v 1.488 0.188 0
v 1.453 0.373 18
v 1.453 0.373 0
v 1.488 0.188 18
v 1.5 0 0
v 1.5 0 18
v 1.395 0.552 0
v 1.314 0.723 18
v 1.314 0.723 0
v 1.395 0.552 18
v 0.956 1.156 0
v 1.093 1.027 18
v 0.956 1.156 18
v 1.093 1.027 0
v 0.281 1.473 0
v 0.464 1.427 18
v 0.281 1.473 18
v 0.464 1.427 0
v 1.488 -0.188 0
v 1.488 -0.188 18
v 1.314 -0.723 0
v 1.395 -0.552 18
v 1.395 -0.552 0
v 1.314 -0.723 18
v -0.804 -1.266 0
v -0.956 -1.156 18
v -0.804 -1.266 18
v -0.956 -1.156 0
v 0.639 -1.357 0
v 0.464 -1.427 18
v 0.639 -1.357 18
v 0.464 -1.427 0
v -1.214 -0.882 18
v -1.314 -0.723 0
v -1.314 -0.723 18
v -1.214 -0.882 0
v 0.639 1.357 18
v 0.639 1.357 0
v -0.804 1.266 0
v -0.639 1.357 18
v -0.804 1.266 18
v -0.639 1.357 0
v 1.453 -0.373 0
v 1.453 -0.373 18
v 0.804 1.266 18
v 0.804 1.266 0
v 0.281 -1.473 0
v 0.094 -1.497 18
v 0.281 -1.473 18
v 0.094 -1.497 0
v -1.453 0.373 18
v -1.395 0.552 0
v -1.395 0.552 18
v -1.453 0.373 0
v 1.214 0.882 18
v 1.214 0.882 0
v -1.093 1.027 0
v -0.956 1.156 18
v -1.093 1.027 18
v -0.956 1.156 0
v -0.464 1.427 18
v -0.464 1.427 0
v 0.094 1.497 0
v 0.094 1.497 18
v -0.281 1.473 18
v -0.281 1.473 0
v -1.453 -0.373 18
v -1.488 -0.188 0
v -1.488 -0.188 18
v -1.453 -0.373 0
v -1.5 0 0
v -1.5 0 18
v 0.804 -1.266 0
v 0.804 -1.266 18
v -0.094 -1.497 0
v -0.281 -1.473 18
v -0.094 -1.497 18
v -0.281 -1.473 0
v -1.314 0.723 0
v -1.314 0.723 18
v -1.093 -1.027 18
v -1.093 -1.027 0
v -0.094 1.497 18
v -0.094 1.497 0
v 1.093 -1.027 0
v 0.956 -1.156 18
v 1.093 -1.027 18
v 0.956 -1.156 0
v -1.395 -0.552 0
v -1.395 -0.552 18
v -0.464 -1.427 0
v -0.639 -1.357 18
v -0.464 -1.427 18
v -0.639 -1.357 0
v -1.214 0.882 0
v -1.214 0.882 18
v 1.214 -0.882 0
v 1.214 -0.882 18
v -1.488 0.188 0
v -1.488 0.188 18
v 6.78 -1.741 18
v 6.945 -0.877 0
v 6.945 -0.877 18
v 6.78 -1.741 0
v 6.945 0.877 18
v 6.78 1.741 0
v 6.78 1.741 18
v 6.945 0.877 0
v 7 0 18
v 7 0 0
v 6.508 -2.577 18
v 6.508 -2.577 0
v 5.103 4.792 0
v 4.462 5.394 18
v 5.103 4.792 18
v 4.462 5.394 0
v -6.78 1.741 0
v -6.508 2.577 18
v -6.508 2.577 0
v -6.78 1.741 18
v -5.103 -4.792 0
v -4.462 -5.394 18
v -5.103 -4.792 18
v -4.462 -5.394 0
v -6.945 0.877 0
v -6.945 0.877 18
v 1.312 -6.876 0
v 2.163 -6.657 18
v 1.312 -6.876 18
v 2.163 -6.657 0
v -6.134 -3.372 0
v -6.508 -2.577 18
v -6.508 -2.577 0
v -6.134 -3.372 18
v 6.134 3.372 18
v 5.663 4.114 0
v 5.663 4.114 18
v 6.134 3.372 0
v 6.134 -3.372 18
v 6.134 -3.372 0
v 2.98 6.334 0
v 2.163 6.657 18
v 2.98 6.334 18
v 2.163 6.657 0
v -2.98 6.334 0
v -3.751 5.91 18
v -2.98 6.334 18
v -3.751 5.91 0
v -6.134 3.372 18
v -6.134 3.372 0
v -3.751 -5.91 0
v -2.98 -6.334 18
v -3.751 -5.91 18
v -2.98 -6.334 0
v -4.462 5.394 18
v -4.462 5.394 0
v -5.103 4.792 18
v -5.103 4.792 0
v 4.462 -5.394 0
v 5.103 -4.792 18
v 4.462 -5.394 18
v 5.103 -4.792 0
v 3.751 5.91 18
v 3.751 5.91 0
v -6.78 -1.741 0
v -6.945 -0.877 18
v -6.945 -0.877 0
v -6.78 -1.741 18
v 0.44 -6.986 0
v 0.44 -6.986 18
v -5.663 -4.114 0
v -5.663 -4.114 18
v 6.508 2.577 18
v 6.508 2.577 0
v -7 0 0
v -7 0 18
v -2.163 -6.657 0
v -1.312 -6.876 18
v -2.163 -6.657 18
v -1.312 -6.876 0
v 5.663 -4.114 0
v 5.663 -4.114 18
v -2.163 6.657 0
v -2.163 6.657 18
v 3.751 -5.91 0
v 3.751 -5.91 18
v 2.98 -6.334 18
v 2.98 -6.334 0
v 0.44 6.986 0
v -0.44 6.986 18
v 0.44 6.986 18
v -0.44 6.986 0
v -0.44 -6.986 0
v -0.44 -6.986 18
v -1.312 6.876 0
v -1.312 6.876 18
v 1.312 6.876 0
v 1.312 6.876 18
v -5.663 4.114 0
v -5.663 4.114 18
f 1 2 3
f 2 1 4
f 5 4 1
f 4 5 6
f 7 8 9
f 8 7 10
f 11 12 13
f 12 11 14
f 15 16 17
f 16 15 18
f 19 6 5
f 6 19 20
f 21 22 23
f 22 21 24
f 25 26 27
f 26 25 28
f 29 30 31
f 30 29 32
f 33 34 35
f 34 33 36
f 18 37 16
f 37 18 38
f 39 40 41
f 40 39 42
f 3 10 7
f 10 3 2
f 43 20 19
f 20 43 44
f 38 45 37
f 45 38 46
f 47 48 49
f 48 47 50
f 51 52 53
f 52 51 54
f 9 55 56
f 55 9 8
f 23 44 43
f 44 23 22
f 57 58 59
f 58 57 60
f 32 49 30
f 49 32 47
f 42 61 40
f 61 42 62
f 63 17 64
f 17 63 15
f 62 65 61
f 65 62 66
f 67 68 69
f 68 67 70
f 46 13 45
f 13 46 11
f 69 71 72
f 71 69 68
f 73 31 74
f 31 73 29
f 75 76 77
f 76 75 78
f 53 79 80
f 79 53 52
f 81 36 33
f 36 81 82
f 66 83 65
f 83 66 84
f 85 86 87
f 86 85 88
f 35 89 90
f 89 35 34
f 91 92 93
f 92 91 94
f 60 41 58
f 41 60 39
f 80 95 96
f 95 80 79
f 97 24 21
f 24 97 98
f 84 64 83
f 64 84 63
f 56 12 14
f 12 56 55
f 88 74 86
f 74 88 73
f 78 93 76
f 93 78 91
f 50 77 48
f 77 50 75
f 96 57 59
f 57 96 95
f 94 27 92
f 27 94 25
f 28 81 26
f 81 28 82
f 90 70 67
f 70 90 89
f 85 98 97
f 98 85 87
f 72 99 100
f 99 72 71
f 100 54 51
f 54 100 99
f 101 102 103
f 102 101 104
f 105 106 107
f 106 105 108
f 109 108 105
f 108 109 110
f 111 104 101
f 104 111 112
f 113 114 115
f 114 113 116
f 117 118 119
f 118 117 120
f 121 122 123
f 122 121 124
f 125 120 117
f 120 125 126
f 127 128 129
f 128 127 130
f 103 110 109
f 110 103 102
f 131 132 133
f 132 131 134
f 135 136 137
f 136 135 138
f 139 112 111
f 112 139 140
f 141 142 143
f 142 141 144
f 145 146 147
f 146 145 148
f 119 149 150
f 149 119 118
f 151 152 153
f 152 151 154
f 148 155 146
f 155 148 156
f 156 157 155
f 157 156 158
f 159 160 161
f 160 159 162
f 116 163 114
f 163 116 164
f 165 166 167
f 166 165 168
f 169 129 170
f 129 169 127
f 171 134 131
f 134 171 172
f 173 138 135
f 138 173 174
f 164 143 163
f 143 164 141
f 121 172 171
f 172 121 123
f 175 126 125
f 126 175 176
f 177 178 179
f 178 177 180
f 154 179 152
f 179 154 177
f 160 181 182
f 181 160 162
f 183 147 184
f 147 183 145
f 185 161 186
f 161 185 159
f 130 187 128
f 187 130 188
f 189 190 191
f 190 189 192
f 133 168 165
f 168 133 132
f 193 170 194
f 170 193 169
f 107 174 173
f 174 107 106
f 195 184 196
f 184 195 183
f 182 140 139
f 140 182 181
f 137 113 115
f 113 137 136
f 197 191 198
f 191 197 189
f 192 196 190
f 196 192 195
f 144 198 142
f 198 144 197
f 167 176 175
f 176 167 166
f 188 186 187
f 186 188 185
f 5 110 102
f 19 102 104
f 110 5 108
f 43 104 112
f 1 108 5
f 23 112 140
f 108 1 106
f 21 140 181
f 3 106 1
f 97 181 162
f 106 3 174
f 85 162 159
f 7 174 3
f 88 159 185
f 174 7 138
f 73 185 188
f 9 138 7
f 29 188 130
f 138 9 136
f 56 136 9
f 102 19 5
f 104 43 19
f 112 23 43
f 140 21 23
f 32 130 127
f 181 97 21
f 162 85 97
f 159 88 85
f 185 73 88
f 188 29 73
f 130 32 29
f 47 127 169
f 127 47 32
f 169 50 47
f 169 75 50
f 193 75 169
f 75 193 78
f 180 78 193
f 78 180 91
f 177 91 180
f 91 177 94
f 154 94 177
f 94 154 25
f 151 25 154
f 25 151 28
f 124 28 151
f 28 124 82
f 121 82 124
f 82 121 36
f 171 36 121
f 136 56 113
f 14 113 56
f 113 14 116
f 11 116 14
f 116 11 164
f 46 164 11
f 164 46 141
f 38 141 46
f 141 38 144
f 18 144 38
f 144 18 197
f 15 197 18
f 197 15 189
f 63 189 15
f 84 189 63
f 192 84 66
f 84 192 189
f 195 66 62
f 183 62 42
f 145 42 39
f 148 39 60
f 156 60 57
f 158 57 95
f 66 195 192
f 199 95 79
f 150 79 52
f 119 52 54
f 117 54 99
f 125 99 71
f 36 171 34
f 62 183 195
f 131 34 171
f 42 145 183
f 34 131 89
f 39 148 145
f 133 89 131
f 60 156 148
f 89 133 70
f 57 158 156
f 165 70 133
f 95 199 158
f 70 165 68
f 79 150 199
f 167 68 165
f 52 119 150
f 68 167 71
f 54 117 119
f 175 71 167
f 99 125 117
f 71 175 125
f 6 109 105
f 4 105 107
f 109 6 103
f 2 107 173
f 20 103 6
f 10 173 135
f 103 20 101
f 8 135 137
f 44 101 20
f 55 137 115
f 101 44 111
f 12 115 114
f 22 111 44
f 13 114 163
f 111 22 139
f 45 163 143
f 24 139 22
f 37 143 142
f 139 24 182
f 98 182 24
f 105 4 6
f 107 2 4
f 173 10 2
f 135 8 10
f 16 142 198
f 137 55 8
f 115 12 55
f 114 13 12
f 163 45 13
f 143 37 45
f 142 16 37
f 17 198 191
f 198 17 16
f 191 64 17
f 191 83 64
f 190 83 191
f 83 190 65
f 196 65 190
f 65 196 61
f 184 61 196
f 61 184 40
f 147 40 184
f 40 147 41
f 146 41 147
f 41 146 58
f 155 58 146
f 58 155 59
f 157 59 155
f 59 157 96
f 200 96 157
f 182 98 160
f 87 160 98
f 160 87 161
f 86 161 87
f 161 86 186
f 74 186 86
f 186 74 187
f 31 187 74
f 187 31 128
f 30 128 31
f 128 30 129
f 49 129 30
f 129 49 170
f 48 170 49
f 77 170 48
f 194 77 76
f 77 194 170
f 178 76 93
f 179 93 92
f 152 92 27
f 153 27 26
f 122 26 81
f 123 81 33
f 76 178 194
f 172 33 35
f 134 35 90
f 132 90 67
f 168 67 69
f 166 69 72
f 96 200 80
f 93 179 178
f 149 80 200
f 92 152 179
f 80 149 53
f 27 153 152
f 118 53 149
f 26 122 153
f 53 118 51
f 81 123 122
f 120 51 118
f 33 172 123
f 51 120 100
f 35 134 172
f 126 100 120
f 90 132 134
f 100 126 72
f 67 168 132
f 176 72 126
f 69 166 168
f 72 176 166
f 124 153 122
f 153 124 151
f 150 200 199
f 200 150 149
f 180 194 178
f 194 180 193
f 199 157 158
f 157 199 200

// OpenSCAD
$fn = 50;


difference() {
	union() {
		cylinder(h = 18, r = 7.0000000000);
	}
	union() {
		translate(v = [0, 0, -100]) {
			cylinder(h = 200, r = 1.5000000000);
		}
		translate(v = [0, 0, -100]) {
			cylinder(h = 200, r = 1.5000000000);
		}
	}
}
